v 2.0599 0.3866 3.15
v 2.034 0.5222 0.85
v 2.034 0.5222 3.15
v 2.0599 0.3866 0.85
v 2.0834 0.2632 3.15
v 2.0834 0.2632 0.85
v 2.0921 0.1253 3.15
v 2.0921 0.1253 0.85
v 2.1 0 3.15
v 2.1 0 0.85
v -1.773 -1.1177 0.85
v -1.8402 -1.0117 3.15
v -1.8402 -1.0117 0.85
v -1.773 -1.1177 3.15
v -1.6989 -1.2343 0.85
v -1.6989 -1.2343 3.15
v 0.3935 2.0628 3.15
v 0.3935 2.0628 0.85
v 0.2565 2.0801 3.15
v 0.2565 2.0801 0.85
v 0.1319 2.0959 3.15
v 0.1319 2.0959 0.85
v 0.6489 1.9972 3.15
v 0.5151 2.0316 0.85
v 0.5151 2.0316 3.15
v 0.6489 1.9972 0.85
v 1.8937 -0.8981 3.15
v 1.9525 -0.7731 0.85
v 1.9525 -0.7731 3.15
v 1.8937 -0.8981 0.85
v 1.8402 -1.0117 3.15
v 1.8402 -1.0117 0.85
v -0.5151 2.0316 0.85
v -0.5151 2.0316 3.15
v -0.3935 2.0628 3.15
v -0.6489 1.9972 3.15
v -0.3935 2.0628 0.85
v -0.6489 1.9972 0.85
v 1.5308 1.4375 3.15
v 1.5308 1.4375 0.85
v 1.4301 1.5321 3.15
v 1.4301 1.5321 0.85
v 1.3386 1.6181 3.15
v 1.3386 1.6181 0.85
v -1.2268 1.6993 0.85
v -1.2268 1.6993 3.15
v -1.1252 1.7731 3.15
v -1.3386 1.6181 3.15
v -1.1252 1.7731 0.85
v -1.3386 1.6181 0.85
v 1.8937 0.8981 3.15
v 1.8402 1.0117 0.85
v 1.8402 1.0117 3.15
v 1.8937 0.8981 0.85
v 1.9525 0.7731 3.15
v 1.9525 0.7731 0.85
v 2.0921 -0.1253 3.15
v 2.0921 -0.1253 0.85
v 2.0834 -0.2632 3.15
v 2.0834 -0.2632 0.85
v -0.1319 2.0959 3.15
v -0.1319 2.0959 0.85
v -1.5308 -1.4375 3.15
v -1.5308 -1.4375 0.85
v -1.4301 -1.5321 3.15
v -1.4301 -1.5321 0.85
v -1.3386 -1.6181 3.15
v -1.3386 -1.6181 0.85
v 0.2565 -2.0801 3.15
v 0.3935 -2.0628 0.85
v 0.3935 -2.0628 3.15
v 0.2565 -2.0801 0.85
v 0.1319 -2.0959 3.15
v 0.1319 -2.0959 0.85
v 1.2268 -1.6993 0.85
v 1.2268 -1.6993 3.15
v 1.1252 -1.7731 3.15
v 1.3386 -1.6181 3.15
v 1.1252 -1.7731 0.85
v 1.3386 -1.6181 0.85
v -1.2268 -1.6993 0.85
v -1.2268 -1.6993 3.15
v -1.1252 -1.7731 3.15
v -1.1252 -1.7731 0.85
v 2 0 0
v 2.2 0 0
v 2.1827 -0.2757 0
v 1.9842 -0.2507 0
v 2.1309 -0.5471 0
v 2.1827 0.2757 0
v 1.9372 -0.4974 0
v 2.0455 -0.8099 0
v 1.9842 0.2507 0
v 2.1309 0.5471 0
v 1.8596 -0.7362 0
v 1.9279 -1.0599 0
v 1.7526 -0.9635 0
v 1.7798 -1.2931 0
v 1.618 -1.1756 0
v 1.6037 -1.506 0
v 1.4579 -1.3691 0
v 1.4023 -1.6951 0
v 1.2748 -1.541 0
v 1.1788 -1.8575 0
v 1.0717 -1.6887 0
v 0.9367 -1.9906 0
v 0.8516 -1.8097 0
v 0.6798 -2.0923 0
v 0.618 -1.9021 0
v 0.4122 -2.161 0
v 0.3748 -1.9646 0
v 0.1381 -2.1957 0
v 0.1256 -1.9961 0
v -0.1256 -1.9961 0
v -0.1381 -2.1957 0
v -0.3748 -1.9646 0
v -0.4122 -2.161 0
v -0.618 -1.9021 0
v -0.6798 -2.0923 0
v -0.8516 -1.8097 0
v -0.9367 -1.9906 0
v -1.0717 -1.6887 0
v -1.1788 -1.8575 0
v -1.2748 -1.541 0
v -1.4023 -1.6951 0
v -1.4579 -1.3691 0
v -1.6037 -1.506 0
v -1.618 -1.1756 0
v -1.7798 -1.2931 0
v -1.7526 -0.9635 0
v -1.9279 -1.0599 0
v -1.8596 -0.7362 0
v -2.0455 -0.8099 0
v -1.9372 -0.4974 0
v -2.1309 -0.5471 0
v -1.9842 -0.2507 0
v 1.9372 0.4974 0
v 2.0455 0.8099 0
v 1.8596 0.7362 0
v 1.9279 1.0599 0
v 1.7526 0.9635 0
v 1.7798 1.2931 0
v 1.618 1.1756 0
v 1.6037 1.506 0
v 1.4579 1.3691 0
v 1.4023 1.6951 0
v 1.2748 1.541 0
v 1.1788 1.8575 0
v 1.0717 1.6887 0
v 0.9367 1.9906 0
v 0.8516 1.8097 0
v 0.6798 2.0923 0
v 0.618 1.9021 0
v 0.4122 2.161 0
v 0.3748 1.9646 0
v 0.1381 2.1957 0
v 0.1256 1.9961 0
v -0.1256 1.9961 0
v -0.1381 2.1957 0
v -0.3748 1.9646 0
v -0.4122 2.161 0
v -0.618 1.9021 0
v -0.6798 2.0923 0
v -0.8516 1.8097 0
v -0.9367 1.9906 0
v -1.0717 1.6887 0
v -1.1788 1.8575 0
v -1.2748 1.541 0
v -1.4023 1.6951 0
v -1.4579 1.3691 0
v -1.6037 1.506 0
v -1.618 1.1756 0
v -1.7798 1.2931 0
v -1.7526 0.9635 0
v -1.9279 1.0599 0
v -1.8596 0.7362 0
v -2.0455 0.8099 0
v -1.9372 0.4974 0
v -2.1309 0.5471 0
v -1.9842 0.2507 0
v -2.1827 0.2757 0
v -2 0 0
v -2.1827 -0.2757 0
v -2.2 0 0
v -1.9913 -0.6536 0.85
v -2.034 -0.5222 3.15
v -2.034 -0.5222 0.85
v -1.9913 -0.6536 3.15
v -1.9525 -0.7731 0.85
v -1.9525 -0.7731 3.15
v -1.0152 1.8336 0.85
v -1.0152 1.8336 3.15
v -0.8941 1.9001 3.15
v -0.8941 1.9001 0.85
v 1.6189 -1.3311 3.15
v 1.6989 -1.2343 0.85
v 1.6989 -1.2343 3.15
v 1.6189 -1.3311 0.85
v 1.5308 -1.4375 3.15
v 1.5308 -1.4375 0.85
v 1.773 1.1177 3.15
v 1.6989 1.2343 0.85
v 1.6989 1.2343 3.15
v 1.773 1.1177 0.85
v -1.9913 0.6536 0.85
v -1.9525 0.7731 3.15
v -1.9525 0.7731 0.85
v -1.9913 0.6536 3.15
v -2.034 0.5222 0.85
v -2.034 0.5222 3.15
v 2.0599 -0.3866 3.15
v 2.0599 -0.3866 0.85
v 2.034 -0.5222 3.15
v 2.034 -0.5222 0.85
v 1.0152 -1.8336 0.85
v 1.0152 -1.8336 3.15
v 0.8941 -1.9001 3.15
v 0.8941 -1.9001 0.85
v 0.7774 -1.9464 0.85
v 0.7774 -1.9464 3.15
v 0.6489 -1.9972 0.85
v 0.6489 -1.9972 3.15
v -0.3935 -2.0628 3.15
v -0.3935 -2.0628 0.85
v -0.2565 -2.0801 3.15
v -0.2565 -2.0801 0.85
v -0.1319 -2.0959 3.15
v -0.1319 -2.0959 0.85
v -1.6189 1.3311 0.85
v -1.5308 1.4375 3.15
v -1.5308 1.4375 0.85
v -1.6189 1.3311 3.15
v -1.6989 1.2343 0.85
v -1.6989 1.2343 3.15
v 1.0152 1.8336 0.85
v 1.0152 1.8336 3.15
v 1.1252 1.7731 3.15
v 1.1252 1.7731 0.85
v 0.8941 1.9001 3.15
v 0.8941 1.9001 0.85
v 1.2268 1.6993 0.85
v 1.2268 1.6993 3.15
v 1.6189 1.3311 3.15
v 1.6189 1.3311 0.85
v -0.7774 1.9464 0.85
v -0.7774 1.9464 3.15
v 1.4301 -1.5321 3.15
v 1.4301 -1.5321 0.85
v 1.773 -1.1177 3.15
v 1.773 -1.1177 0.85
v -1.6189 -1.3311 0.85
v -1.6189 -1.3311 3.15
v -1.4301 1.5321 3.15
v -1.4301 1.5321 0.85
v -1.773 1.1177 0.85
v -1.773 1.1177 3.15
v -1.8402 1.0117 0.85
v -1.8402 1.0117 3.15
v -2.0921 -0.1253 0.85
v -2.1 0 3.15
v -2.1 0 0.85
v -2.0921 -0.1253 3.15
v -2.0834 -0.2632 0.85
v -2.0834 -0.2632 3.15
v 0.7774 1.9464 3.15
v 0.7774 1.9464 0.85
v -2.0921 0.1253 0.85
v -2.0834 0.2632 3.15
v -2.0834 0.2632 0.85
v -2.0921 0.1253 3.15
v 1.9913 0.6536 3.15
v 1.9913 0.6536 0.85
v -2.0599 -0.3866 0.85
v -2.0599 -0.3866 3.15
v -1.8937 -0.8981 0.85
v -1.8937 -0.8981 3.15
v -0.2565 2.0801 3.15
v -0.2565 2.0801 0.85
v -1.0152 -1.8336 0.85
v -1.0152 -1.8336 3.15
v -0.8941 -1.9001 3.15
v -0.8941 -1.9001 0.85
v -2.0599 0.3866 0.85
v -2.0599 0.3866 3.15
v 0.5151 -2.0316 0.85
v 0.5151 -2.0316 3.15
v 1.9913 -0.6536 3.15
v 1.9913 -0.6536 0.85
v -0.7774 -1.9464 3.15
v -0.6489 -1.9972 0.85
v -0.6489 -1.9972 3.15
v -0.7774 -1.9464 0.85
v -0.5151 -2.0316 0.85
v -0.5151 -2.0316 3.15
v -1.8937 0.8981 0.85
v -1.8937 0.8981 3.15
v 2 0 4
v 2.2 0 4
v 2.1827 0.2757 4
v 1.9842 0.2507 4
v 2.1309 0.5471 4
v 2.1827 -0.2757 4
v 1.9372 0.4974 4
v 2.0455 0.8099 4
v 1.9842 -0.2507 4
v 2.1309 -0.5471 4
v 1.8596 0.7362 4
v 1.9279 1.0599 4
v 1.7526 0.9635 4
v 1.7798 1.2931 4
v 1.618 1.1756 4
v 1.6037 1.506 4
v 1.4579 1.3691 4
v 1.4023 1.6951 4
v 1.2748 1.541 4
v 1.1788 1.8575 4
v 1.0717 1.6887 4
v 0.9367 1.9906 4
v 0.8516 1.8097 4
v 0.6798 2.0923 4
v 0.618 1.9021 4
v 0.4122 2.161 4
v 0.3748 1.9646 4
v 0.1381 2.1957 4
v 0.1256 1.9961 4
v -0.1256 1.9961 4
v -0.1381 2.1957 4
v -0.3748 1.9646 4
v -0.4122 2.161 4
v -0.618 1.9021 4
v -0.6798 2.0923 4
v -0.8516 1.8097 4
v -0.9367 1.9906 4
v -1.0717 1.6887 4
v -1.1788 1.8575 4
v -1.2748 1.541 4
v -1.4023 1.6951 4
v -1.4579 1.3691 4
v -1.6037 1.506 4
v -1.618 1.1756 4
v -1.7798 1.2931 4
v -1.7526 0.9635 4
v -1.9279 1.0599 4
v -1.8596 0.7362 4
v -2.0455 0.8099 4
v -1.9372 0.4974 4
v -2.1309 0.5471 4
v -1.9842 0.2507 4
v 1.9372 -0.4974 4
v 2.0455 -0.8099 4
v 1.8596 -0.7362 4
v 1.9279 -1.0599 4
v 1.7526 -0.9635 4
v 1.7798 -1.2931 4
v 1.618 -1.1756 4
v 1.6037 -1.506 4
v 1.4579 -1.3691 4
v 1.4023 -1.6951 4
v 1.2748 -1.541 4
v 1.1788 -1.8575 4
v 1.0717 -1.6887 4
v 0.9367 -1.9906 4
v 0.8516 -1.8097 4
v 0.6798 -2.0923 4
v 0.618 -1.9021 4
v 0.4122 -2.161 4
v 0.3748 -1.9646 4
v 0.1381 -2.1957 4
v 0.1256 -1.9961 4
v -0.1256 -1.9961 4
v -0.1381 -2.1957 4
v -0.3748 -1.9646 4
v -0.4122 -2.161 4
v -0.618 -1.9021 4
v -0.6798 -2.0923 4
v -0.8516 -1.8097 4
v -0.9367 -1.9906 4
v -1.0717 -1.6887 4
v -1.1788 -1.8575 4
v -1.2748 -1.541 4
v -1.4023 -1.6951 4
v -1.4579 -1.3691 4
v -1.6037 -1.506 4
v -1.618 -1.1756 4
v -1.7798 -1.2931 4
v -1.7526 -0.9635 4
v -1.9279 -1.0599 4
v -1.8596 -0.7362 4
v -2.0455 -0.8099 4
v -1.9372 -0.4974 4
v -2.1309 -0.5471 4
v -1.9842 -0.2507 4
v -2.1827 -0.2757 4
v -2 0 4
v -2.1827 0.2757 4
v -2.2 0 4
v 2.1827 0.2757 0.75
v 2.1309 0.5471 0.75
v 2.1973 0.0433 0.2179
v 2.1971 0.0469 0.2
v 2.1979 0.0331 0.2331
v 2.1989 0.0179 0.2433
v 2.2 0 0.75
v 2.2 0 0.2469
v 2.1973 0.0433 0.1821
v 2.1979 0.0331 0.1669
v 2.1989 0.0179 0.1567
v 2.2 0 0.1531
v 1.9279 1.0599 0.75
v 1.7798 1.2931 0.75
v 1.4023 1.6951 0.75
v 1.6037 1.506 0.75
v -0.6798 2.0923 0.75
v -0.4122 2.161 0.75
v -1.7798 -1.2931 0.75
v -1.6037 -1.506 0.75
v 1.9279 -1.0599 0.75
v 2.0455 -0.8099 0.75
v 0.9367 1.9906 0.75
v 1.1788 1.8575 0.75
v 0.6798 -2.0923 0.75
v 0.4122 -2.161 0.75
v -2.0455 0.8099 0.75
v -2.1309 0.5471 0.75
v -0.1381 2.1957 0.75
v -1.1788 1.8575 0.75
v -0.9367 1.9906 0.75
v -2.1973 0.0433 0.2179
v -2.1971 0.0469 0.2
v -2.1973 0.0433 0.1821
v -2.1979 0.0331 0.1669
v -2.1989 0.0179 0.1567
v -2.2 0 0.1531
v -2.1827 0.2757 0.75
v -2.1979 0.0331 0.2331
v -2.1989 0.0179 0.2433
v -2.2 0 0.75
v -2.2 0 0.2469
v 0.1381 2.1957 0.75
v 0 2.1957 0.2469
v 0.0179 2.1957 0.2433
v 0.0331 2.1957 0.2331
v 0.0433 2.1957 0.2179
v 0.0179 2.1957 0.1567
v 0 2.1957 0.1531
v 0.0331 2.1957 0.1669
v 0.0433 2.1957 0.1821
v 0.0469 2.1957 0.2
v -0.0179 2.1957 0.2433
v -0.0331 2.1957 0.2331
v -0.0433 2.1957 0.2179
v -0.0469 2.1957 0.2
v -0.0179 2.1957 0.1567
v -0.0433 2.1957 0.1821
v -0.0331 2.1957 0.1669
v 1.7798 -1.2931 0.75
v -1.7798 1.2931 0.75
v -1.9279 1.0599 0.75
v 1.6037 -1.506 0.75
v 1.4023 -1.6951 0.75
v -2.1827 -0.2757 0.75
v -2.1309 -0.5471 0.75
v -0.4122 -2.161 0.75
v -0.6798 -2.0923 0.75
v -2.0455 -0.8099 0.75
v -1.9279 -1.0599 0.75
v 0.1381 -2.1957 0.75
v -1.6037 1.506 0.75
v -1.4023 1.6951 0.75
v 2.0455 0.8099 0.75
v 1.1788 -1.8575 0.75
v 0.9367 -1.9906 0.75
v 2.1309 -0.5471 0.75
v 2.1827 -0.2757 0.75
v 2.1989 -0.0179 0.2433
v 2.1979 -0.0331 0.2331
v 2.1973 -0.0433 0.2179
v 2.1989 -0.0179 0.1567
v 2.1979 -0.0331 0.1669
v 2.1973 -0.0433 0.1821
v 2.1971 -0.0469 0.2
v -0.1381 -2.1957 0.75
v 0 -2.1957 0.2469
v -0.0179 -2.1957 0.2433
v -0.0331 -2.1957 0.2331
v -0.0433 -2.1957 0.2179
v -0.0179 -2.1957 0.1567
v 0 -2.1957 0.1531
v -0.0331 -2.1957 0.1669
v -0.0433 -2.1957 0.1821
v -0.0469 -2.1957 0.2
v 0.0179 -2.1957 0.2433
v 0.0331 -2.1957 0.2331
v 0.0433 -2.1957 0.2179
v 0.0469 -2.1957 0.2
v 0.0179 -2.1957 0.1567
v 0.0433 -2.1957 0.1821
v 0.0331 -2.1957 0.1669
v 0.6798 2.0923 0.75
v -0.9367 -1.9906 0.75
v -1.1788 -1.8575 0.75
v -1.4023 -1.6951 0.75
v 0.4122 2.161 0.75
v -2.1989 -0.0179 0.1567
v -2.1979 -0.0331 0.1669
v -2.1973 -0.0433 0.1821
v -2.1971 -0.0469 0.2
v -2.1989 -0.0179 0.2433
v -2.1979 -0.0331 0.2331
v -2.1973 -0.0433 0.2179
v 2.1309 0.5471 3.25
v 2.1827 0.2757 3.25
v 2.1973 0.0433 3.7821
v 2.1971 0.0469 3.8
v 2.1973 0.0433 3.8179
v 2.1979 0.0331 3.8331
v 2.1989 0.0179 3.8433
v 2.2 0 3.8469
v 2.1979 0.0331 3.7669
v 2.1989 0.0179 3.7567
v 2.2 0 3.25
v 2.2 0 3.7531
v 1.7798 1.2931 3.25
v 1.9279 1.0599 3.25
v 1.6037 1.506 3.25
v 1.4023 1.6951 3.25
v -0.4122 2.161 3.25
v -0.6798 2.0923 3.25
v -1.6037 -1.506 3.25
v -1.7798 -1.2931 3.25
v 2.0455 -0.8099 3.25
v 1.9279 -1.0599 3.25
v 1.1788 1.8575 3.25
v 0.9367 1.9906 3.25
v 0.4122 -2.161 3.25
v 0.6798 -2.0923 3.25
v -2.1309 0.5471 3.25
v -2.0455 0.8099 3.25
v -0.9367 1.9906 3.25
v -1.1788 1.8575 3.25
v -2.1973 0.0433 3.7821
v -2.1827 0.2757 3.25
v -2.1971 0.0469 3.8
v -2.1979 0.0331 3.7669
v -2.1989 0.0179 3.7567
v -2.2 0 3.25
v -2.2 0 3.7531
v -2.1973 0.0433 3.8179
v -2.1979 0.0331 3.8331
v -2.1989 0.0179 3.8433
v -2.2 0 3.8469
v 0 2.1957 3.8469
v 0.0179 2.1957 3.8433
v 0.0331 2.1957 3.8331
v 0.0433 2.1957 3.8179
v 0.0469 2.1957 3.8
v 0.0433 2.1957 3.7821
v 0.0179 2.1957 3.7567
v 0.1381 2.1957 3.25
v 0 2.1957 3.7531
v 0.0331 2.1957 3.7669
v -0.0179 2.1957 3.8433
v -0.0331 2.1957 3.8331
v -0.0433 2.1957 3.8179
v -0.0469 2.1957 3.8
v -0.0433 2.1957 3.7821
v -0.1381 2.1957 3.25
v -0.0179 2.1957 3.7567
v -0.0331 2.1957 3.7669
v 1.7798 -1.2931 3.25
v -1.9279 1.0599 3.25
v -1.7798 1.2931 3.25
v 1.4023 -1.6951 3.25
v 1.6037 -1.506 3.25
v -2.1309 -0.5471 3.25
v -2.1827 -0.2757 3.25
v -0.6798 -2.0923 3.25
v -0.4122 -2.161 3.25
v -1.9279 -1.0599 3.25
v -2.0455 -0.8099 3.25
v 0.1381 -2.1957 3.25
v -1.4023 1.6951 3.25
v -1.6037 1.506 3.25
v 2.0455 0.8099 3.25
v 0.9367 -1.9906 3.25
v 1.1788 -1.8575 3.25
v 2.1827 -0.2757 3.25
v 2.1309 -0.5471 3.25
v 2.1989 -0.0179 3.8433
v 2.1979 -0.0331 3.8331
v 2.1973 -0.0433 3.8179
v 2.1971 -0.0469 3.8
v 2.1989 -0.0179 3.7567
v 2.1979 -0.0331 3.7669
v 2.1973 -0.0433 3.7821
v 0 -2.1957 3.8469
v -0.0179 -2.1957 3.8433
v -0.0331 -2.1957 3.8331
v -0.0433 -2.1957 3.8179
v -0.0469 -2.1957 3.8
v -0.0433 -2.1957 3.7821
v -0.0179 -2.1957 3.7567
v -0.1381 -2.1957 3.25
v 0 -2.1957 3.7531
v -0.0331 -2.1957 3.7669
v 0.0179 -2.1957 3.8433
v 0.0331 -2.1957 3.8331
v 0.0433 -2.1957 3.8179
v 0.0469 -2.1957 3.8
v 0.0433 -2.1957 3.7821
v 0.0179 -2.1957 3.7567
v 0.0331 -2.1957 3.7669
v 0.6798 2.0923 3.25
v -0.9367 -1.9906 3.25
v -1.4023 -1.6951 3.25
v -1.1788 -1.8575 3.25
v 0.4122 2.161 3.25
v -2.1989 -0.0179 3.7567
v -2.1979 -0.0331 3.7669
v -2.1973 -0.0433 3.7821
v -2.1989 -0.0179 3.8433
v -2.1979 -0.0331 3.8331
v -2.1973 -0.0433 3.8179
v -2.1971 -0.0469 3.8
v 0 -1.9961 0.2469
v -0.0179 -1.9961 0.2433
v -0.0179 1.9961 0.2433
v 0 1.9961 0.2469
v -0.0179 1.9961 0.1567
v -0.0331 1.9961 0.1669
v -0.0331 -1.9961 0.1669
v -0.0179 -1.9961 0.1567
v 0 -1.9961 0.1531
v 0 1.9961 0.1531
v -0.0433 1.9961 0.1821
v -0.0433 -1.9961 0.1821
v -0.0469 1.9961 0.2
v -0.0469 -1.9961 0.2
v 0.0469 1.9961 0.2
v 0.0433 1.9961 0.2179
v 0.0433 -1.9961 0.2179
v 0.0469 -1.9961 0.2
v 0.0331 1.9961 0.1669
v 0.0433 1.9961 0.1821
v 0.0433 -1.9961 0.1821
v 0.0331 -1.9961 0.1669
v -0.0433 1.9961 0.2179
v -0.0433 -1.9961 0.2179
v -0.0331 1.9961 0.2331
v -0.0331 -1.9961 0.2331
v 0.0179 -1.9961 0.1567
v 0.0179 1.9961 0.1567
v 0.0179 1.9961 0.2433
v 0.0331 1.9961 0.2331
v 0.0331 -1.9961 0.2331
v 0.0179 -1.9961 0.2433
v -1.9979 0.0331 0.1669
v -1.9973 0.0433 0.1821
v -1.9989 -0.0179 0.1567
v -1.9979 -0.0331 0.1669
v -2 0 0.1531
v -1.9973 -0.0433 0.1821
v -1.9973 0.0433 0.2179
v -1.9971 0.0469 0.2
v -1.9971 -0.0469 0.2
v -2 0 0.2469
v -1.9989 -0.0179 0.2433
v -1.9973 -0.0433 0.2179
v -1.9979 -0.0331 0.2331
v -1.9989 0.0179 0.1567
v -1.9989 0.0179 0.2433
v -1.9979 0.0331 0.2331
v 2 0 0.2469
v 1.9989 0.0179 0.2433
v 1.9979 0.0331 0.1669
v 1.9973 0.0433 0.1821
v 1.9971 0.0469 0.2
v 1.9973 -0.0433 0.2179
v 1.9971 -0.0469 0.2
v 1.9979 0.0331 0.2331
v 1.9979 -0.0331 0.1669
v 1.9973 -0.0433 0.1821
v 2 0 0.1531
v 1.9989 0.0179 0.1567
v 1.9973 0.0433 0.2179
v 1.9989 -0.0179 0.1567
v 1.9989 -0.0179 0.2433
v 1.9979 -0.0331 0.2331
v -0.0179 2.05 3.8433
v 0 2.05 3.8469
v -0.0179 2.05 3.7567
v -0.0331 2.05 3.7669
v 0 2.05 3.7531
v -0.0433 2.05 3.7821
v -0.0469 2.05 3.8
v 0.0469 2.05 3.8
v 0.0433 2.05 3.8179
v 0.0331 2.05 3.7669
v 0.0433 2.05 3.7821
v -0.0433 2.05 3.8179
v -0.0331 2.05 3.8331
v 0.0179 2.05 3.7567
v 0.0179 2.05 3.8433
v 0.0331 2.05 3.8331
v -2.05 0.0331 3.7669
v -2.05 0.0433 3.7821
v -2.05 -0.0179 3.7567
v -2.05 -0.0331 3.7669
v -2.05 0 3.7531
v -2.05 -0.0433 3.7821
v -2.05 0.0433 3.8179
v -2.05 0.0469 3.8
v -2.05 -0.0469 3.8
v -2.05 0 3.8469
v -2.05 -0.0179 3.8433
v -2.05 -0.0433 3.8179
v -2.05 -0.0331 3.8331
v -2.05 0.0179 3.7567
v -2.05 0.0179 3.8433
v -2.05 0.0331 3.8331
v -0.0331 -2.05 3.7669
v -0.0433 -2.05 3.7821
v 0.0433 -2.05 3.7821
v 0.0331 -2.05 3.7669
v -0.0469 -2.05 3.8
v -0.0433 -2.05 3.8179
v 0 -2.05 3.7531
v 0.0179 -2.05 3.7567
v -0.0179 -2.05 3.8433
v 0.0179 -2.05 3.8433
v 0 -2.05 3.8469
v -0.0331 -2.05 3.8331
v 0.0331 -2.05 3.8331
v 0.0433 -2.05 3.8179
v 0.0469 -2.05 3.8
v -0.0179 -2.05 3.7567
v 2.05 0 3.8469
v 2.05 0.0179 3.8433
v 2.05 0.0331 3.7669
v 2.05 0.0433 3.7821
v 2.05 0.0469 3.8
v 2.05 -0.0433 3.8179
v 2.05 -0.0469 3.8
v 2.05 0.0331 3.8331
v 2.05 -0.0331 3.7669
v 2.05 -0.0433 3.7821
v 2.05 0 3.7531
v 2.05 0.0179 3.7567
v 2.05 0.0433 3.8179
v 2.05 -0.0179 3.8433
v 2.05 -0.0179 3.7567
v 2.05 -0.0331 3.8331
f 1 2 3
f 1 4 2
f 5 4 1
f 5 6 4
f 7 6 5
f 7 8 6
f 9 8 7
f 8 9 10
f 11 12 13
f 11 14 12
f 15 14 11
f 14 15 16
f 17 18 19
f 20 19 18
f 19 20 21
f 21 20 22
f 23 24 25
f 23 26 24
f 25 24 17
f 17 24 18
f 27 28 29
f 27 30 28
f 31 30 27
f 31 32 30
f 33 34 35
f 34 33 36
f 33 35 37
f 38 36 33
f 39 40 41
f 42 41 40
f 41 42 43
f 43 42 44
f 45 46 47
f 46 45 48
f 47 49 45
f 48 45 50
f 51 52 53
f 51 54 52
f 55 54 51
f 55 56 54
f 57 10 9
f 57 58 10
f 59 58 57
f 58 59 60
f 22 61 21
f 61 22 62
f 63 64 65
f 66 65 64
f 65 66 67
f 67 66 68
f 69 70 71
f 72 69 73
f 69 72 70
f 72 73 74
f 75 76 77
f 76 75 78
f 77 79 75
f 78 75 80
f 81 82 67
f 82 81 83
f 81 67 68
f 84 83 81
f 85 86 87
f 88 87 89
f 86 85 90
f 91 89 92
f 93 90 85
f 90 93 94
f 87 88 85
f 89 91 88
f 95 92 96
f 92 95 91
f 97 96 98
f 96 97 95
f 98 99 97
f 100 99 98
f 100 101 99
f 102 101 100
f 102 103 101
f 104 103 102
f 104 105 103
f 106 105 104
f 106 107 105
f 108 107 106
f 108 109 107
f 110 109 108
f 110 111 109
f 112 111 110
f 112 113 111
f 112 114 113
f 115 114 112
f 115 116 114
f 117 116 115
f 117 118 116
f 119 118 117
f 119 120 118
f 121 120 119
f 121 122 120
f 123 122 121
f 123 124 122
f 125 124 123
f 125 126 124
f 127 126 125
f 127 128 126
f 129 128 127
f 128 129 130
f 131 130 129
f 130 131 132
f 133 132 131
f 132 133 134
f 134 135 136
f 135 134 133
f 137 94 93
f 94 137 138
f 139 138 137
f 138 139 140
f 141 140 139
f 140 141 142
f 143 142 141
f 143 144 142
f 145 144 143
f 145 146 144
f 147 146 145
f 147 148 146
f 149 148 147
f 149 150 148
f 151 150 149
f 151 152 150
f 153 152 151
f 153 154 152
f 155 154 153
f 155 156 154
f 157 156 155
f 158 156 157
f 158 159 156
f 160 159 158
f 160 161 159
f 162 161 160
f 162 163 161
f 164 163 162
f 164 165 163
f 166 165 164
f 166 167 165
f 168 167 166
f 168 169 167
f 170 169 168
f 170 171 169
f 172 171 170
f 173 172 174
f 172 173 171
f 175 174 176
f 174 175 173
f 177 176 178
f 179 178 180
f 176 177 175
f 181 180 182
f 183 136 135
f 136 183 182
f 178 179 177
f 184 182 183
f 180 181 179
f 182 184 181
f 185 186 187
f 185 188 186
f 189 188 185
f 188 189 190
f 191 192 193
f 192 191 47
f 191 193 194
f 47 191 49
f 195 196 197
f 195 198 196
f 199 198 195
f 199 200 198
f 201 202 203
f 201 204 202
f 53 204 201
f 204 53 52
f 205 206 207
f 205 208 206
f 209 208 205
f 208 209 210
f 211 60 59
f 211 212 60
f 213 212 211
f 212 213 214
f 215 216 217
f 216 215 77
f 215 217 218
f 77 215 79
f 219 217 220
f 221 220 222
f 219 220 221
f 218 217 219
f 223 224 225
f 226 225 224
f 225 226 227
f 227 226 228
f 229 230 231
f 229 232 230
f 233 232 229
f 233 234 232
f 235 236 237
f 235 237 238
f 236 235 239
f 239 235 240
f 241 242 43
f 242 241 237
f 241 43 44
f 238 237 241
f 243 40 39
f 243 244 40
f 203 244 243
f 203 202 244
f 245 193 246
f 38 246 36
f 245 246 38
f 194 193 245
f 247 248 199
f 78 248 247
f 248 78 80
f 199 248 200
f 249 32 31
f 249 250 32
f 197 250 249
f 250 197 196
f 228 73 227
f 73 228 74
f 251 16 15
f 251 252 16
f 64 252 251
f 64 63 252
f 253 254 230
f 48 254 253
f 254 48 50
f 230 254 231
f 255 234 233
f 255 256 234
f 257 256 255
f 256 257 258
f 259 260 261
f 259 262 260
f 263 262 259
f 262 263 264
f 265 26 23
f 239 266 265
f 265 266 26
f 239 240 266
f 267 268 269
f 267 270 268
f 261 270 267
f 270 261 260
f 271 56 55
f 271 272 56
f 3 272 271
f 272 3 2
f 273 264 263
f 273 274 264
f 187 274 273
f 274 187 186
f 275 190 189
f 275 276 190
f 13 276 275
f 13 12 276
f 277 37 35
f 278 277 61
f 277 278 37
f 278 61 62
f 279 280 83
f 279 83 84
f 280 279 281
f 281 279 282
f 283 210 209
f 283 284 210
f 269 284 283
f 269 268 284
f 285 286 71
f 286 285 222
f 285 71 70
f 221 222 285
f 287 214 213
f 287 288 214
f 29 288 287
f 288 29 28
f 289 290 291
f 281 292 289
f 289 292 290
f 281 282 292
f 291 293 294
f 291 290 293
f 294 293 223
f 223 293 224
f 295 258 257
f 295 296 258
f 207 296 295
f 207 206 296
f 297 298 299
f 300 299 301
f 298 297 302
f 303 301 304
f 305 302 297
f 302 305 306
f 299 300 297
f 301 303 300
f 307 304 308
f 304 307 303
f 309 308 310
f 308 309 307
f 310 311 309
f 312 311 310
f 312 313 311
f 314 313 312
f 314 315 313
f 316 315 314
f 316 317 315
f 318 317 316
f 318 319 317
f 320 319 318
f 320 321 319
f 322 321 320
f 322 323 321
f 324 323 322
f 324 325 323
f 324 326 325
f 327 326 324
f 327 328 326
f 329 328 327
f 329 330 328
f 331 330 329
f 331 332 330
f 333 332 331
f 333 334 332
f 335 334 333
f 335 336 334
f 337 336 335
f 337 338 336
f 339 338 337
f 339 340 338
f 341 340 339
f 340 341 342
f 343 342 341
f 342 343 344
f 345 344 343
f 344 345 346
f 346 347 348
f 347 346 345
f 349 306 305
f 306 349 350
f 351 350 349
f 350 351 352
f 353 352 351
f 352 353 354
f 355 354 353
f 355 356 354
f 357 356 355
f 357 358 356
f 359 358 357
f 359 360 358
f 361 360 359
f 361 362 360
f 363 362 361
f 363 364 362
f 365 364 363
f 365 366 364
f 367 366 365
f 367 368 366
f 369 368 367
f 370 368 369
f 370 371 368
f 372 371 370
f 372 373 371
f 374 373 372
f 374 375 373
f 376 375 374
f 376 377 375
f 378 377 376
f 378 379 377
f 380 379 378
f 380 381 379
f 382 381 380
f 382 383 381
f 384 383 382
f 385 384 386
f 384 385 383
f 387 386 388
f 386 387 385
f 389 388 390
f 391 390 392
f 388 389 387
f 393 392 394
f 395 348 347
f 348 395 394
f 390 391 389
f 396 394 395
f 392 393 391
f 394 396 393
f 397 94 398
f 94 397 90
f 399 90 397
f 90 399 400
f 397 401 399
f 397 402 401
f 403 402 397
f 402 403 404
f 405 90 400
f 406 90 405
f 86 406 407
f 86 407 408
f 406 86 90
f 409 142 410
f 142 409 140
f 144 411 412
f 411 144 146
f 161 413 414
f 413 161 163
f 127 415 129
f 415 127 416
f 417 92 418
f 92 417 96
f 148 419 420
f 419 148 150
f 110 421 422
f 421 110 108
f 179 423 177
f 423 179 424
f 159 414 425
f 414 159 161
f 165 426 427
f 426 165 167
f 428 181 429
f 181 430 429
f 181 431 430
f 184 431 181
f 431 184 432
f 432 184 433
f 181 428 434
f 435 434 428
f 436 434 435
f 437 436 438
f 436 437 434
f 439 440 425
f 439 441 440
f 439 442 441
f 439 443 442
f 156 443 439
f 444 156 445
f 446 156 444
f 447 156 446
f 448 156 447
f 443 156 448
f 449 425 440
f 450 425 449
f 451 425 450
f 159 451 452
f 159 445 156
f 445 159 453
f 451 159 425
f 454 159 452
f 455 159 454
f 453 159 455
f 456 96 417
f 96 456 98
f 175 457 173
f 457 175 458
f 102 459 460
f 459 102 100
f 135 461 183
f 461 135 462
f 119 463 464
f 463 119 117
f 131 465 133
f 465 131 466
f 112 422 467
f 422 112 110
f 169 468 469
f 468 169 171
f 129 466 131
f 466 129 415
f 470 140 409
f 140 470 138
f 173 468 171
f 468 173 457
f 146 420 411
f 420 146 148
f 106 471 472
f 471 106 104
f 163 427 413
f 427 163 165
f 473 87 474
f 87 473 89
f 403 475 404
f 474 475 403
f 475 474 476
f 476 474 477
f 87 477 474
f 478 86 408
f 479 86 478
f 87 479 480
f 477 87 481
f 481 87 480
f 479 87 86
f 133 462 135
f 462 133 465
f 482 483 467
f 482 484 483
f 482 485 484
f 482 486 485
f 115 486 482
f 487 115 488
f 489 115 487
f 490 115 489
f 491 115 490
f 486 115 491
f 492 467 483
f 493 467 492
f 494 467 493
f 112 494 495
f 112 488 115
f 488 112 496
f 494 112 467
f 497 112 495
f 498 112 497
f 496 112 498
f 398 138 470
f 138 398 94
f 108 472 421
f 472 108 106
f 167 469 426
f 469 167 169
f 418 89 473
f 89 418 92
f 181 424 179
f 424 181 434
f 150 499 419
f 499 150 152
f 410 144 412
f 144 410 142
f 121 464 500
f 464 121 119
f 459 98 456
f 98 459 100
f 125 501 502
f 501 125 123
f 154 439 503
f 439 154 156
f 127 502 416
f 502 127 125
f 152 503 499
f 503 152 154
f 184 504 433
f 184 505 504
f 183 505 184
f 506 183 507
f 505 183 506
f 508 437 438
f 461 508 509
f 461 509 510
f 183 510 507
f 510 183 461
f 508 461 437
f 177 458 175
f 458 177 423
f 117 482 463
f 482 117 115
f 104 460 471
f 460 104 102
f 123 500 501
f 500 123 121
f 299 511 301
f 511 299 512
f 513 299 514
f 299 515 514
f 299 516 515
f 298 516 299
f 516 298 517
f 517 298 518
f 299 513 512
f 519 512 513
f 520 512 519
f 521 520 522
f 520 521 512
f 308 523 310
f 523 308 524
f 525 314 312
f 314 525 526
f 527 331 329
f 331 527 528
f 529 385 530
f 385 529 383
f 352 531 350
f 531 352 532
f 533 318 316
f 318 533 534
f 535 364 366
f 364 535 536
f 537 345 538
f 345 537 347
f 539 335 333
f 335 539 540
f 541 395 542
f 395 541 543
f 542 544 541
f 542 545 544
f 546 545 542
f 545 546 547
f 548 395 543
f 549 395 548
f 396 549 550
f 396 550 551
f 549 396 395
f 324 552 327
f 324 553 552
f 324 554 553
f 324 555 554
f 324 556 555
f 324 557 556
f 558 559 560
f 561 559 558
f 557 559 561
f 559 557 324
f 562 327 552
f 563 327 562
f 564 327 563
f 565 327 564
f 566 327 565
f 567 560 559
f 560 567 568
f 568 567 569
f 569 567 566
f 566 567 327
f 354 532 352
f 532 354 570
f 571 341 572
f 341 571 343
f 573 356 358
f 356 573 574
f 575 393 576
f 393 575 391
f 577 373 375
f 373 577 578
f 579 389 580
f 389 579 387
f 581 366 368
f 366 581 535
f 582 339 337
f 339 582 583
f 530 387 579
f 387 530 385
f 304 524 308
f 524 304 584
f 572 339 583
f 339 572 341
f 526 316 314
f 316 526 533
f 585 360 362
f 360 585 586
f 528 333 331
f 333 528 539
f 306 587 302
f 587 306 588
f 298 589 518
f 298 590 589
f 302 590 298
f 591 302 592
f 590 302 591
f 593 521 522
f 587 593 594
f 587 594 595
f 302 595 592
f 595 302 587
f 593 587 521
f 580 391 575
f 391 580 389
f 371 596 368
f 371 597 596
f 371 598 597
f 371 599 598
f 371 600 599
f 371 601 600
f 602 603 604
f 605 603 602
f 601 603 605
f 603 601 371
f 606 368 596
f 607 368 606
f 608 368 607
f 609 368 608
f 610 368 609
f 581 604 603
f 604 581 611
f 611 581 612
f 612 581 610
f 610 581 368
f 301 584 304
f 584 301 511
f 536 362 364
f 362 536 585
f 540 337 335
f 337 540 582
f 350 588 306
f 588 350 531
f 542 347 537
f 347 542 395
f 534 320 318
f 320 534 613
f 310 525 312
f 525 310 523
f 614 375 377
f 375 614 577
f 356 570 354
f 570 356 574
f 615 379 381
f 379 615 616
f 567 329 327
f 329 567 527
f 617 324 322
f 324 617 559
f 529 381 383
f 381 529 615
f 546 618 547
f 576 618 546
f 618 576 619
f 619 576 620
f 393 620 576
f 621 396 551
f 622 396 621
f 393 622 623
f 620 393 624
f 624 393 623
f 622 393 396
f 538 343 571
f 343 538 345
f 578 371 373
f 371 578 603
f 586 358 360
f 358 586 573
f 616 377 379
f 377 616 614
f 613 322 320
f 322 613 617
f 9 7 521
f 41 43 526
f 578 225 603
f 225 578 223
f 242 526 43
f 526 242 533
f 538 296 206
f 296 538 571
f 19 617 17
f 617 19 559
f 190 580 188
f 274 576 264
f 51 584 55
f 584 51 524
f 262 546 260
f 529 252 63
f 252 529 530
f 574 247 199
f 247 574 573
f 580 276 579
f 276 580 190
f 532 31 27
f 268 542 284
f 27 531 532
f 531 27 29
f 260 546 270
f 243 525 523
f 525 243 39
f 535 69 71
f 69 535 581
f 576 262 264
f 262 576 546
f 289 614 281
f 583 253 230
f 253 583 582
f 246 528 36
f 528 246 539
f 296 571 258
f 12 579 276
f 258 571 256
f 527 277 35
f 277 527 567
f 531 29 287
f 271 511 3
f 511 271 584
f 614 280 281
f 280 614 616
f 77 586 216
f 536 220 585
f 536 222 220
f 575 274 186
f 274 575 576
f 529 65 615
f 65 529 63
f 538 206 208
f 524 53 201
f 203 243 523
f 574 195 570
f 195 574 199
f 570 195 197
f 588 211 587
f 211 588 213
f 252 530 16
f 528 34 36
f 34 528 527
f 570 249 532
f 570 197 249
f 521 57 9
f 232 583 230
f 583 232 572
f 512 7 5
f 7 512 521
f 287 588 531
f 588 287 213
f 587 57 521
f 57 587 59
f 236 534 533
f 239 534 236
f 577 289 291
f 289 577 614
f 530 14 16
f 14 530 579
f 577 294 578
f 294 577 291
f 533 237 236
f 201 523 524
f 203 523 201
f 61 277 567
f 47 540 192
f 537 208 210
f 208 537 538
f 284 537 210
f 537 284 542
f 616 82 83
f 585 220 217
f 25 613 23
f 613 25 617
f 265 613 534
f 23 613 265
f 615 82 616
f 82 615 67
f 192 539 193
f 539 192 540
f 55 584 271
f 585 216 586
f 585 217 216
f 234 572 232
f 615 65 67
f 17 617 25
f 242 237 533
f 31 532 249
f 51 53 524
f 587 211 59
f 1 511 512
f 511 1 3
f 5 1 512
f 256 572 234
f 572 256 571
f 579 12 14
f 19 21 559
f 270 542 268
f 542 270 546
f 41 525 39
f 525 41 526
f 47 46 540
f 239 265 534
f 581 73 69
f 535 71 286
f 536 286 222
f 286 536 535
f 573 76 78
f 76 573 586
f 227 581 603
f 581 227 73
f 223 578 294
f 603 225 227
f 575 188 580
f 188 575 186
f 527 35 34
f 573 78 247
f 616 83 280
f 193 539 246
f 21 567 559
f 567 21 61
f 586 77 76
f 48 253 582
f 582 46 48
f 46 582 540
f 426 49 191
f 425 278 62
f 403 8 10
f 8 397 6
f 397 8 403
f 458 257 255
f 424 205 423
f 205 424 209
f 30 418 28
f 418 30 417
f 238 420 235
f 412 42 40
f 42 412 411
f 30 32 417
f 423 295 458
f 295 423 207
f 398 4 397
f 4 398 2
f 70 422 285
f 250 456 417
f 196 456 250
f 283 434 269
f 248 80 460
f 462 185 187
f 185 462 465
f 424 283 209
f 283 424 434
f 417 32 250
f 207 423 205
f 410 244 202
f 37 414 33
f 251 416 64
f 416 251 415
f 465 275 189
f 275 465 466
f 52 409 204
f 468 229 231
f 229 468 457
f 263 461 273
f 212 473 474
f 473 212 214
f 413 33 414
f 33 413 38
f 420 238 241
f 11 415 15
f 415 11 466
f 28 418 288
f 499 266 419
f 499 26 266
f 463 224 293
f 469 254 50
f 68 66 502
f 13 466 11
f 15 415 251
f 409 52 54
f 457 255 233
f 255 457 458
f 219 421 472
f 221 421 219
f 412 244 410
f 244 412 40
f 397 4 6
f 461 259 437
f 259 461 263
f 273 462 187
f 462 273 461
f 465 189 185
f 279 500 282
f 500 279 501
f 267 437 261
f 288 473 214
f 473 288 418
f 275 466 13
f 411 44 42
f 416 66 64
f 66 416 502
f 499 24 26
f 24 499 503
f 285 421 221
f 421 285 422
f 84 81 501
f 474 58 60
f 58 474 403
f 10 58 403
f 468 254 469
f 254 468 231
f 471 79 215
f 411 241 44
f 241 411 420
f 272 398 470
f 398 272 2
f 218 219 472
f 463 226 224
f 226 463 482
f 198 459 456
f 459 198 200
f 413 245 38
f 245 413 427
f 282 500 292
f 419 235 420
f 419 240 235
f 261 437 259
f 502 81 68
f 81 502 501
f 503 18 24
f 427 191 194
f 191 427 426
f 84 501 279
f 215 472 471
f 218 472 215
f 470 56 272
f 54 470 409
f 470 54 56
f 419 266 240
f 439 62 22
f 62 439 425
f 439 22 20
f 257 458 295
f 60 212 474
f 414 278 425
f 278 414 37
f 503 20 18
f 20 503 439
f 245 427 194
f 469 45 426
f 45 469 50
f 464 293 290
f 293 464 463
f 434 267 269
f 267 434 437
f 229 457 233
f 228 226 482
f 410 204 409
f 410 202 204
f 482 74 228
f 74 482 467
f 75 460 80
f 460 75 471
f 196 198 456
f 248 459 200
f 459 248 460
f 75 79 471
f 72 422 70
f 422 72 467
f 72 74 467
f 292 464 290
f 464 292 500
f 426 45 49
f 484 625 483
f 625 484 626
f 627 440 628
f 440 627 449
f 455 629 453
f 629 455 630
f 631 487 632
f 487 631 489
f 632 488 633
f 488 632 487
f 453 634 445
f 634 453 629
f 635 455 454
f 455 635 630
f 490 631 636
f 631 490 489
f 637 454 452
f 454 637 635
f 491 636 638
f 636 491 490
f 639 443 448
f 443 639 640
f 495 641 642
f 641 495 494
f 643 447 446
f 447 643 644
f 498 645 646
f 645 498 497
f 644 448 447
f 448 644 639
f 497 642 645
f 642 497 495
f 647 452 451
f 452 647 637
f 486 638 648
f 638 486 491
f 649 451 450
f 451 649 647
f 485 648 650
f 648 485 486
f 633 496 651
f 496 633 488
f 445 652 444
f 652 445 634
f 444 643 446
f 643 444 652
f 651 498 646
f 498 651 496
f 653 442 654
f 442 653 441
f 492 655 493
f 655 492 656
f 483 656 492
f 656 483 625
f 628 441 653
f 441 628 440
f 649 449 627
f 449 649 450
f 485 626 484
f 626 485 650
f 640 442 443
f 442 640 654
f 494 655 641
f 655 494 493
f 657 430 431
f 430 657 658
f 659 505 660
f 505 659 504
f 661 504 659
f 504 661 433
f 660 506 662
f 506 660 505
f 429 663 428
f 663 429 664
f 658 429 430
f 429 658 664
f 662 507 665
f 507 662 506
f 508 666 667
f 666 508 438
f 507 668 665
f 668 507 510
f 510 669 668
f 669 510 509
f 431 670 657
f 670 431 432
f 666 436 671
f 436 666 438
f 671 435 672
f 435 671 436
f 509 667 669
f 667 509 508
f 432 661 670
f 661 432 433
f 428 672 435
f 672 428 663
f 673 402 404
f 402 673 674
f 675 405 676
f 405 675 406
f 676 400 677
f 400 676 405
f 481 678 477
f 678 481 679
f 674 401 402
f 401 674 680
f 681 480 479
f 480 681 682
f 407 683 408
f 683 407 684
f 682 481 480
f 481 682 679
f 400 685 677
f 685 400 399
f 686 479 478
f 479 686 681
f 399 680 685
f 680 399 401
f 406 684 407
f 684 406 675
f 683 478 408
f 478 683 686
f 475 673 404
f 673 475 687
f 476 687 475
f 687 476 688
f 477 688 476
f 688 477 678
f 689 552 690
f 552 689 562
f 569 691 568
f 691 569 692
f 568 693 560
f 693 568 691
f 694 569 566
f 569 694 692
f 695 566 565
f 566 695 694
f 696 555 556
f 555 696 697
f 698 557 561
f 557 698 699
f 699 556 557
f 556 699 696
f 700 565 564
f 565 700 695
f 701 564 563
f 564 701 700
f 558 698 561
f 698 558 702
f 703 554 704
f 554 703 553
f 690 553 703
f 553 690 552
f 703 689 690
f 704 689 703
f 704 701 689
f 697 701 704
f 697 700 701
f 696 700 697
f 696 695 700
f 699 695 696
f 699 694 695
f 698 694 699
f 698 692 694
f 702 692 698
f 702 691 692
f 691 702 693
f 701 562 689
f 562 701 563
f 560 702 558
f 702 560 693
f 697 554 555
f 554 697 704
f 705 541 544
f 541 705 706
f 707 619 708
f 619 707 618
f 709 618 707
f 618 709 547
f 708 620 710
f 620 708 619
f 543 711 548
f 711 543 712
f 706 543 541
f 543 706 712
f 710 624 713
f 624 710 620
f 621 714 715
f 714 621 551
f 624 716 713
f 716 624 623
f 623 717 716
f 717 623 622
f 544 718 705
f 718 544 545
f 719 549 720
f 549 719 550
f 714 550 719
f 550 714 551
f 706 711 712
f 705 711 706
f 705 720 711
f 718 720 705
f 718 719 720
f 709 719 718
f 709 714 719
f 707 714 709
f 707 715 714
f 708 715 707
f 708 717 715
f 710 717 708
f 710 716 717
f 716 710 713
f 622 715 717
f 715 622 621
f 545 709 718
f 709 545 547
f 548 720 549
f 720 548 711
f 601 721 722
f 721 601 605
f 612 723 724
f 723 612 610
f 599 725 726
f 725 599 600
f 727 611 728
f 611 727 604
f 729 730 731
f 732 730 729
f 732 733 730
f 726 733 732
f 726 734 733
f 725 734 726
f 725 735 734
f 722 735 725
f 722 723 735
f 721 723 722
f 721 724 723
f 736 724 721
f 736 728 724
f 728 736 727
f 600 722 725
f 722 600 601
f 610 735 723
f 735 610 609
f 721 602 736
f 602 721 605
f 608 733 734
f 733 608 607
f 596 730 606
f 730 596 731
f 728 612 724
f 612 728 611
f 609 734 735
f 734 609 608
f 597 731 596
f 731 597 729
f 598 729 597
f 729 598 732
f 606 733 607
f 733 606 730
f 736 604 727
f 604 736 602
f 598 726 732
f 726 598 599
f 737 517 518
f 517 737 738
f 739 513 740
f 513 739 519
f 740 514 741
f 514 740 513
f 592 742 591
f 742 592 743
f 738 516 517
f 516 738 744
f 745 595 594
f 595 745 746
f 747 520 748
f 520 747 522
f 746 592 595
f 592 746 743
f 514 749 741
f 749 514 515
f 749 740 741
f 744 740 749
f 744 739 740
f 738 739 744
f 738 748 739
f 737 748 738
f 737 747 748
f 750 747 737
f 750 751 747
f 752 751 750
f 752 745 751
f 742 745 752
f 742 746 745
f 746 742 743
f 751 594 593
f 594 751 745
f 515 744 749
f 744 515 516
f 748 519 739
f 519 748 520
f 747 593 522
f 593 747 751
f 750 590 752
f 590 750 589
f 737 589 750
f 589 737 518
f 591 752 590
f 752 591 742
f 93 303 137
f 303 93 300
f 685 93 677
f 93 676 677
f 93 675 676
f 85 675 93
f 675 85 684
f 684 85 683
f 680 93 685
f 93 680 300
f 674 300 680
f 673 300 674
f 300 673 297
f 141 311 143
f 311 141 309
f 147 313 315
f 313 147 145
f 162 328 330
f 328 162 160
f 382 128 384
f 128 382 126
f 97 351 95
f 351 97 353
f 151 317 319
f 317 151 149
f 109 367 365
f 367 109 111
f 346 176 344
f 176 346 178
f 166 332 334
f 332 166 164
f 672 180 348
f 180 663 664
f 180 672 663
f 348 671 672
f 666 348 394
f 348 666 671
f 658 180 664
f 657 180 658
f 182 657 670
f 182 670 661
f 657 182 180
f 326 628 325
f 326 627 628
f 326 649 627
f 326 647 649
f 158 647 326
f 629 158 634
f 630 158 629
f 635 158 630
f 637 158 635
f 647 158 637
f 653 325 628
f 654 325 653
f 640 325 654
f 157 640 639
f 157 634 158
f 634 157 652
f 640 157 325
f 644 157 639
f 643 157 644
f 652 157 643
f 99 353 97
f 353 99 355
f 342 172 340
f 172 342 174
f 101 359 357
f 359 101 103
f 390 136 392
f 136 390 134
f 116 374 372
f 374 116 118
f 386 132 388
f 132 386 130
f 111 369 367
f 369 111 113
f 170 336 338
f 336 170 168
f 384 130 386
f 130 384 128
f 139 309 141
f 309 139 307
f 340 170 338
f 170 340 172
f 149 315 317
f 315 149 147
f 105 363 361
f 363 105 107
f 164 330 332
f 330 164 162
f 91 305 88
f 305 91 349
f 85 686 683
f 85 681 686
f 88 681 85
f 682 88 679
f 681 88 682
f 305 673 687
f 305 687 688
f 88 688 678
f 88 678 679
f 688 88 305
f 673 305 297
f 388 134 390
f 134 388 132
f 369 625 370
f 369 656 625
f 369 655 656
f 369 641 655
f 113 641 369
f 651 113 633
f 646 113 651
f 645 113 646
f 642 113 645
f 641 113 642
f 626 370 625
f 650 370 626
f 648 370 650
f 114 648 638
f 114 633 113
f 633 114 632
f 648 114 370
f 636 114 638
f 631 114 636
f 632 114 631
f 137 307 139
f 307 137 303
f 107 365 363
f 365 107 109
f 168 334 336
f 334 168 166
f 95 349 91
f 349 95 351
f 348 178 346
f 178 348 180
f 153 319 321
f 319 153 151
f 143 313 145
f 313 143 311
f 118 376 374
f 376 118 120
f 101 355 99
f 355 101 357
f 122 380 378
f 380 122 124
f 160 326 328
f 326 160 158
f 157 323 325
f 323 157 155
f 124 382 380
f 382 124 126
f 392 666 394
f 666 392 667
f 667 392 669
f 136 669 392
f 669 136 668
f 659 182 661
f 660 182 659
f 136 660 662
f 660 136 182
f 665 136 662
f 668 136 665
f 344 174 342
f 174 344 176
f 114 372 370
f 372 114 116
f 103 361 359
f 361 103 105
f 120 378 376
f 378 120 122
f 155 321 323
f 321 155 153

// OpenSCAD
length=4;
InnerDiameter=4;
radius=InnerDiameter/2;
//If wallThickness is larger than brimThickness than there will not be a brim.
wallThickness=0.1;
brimThickness=0.2;
brimLength=0.75;
//These holes were put in to be tapped. This is the mounting mechanism. Set holeDiameter to 0.0 if you do not want them.
holeDiameter=.09375;
holeOffset=.2;
numberOfHoles=4;
//Set to 0 if you do not want holes at the top of the lens hood. These were put in as a plan B should the holes at the bottom strip.
topHoles=1;
//Resolution
res=50;

difference()
{
	union()
	{
	cylinder(r=radius+wallThickness,h=length,$fn=res);
	cylinder(r=radius+brimThickness,h=brimLength,$fn=res);
	translate([0,0,length-brimLength])cylinder(r=radius+brimThickness,h=brimLength,$fn=res);
	translate([0,0,length-brimLength-brimThickness])
	cylinder(r=radius,r2=radius+brimThickness,h=brimThickness,$fn=res);
	translate([0,0,brimLength])
	cylinder(r=radius+brimThickness,r2=radius,h=brimThickness,$fn=res);
	}
	for(k=[0:topHoles])
	translate([0,0,k*(length-holeOffset*2)])
		{
		for(i=[1:numberOfHoles])
		rotate([0,0,i*360/numberOfHoles])
		translate([k*(radius+0.05),0,holeOffset])rotate([0,90,0])
		cylinder(h=radius+brimThickness+0.1,r=holeDiameter/2,$fn=res/3);
		}
	translate([0,0,-0.1])cylinder(r=radius,h=length+0.2,$fn=res);
}
